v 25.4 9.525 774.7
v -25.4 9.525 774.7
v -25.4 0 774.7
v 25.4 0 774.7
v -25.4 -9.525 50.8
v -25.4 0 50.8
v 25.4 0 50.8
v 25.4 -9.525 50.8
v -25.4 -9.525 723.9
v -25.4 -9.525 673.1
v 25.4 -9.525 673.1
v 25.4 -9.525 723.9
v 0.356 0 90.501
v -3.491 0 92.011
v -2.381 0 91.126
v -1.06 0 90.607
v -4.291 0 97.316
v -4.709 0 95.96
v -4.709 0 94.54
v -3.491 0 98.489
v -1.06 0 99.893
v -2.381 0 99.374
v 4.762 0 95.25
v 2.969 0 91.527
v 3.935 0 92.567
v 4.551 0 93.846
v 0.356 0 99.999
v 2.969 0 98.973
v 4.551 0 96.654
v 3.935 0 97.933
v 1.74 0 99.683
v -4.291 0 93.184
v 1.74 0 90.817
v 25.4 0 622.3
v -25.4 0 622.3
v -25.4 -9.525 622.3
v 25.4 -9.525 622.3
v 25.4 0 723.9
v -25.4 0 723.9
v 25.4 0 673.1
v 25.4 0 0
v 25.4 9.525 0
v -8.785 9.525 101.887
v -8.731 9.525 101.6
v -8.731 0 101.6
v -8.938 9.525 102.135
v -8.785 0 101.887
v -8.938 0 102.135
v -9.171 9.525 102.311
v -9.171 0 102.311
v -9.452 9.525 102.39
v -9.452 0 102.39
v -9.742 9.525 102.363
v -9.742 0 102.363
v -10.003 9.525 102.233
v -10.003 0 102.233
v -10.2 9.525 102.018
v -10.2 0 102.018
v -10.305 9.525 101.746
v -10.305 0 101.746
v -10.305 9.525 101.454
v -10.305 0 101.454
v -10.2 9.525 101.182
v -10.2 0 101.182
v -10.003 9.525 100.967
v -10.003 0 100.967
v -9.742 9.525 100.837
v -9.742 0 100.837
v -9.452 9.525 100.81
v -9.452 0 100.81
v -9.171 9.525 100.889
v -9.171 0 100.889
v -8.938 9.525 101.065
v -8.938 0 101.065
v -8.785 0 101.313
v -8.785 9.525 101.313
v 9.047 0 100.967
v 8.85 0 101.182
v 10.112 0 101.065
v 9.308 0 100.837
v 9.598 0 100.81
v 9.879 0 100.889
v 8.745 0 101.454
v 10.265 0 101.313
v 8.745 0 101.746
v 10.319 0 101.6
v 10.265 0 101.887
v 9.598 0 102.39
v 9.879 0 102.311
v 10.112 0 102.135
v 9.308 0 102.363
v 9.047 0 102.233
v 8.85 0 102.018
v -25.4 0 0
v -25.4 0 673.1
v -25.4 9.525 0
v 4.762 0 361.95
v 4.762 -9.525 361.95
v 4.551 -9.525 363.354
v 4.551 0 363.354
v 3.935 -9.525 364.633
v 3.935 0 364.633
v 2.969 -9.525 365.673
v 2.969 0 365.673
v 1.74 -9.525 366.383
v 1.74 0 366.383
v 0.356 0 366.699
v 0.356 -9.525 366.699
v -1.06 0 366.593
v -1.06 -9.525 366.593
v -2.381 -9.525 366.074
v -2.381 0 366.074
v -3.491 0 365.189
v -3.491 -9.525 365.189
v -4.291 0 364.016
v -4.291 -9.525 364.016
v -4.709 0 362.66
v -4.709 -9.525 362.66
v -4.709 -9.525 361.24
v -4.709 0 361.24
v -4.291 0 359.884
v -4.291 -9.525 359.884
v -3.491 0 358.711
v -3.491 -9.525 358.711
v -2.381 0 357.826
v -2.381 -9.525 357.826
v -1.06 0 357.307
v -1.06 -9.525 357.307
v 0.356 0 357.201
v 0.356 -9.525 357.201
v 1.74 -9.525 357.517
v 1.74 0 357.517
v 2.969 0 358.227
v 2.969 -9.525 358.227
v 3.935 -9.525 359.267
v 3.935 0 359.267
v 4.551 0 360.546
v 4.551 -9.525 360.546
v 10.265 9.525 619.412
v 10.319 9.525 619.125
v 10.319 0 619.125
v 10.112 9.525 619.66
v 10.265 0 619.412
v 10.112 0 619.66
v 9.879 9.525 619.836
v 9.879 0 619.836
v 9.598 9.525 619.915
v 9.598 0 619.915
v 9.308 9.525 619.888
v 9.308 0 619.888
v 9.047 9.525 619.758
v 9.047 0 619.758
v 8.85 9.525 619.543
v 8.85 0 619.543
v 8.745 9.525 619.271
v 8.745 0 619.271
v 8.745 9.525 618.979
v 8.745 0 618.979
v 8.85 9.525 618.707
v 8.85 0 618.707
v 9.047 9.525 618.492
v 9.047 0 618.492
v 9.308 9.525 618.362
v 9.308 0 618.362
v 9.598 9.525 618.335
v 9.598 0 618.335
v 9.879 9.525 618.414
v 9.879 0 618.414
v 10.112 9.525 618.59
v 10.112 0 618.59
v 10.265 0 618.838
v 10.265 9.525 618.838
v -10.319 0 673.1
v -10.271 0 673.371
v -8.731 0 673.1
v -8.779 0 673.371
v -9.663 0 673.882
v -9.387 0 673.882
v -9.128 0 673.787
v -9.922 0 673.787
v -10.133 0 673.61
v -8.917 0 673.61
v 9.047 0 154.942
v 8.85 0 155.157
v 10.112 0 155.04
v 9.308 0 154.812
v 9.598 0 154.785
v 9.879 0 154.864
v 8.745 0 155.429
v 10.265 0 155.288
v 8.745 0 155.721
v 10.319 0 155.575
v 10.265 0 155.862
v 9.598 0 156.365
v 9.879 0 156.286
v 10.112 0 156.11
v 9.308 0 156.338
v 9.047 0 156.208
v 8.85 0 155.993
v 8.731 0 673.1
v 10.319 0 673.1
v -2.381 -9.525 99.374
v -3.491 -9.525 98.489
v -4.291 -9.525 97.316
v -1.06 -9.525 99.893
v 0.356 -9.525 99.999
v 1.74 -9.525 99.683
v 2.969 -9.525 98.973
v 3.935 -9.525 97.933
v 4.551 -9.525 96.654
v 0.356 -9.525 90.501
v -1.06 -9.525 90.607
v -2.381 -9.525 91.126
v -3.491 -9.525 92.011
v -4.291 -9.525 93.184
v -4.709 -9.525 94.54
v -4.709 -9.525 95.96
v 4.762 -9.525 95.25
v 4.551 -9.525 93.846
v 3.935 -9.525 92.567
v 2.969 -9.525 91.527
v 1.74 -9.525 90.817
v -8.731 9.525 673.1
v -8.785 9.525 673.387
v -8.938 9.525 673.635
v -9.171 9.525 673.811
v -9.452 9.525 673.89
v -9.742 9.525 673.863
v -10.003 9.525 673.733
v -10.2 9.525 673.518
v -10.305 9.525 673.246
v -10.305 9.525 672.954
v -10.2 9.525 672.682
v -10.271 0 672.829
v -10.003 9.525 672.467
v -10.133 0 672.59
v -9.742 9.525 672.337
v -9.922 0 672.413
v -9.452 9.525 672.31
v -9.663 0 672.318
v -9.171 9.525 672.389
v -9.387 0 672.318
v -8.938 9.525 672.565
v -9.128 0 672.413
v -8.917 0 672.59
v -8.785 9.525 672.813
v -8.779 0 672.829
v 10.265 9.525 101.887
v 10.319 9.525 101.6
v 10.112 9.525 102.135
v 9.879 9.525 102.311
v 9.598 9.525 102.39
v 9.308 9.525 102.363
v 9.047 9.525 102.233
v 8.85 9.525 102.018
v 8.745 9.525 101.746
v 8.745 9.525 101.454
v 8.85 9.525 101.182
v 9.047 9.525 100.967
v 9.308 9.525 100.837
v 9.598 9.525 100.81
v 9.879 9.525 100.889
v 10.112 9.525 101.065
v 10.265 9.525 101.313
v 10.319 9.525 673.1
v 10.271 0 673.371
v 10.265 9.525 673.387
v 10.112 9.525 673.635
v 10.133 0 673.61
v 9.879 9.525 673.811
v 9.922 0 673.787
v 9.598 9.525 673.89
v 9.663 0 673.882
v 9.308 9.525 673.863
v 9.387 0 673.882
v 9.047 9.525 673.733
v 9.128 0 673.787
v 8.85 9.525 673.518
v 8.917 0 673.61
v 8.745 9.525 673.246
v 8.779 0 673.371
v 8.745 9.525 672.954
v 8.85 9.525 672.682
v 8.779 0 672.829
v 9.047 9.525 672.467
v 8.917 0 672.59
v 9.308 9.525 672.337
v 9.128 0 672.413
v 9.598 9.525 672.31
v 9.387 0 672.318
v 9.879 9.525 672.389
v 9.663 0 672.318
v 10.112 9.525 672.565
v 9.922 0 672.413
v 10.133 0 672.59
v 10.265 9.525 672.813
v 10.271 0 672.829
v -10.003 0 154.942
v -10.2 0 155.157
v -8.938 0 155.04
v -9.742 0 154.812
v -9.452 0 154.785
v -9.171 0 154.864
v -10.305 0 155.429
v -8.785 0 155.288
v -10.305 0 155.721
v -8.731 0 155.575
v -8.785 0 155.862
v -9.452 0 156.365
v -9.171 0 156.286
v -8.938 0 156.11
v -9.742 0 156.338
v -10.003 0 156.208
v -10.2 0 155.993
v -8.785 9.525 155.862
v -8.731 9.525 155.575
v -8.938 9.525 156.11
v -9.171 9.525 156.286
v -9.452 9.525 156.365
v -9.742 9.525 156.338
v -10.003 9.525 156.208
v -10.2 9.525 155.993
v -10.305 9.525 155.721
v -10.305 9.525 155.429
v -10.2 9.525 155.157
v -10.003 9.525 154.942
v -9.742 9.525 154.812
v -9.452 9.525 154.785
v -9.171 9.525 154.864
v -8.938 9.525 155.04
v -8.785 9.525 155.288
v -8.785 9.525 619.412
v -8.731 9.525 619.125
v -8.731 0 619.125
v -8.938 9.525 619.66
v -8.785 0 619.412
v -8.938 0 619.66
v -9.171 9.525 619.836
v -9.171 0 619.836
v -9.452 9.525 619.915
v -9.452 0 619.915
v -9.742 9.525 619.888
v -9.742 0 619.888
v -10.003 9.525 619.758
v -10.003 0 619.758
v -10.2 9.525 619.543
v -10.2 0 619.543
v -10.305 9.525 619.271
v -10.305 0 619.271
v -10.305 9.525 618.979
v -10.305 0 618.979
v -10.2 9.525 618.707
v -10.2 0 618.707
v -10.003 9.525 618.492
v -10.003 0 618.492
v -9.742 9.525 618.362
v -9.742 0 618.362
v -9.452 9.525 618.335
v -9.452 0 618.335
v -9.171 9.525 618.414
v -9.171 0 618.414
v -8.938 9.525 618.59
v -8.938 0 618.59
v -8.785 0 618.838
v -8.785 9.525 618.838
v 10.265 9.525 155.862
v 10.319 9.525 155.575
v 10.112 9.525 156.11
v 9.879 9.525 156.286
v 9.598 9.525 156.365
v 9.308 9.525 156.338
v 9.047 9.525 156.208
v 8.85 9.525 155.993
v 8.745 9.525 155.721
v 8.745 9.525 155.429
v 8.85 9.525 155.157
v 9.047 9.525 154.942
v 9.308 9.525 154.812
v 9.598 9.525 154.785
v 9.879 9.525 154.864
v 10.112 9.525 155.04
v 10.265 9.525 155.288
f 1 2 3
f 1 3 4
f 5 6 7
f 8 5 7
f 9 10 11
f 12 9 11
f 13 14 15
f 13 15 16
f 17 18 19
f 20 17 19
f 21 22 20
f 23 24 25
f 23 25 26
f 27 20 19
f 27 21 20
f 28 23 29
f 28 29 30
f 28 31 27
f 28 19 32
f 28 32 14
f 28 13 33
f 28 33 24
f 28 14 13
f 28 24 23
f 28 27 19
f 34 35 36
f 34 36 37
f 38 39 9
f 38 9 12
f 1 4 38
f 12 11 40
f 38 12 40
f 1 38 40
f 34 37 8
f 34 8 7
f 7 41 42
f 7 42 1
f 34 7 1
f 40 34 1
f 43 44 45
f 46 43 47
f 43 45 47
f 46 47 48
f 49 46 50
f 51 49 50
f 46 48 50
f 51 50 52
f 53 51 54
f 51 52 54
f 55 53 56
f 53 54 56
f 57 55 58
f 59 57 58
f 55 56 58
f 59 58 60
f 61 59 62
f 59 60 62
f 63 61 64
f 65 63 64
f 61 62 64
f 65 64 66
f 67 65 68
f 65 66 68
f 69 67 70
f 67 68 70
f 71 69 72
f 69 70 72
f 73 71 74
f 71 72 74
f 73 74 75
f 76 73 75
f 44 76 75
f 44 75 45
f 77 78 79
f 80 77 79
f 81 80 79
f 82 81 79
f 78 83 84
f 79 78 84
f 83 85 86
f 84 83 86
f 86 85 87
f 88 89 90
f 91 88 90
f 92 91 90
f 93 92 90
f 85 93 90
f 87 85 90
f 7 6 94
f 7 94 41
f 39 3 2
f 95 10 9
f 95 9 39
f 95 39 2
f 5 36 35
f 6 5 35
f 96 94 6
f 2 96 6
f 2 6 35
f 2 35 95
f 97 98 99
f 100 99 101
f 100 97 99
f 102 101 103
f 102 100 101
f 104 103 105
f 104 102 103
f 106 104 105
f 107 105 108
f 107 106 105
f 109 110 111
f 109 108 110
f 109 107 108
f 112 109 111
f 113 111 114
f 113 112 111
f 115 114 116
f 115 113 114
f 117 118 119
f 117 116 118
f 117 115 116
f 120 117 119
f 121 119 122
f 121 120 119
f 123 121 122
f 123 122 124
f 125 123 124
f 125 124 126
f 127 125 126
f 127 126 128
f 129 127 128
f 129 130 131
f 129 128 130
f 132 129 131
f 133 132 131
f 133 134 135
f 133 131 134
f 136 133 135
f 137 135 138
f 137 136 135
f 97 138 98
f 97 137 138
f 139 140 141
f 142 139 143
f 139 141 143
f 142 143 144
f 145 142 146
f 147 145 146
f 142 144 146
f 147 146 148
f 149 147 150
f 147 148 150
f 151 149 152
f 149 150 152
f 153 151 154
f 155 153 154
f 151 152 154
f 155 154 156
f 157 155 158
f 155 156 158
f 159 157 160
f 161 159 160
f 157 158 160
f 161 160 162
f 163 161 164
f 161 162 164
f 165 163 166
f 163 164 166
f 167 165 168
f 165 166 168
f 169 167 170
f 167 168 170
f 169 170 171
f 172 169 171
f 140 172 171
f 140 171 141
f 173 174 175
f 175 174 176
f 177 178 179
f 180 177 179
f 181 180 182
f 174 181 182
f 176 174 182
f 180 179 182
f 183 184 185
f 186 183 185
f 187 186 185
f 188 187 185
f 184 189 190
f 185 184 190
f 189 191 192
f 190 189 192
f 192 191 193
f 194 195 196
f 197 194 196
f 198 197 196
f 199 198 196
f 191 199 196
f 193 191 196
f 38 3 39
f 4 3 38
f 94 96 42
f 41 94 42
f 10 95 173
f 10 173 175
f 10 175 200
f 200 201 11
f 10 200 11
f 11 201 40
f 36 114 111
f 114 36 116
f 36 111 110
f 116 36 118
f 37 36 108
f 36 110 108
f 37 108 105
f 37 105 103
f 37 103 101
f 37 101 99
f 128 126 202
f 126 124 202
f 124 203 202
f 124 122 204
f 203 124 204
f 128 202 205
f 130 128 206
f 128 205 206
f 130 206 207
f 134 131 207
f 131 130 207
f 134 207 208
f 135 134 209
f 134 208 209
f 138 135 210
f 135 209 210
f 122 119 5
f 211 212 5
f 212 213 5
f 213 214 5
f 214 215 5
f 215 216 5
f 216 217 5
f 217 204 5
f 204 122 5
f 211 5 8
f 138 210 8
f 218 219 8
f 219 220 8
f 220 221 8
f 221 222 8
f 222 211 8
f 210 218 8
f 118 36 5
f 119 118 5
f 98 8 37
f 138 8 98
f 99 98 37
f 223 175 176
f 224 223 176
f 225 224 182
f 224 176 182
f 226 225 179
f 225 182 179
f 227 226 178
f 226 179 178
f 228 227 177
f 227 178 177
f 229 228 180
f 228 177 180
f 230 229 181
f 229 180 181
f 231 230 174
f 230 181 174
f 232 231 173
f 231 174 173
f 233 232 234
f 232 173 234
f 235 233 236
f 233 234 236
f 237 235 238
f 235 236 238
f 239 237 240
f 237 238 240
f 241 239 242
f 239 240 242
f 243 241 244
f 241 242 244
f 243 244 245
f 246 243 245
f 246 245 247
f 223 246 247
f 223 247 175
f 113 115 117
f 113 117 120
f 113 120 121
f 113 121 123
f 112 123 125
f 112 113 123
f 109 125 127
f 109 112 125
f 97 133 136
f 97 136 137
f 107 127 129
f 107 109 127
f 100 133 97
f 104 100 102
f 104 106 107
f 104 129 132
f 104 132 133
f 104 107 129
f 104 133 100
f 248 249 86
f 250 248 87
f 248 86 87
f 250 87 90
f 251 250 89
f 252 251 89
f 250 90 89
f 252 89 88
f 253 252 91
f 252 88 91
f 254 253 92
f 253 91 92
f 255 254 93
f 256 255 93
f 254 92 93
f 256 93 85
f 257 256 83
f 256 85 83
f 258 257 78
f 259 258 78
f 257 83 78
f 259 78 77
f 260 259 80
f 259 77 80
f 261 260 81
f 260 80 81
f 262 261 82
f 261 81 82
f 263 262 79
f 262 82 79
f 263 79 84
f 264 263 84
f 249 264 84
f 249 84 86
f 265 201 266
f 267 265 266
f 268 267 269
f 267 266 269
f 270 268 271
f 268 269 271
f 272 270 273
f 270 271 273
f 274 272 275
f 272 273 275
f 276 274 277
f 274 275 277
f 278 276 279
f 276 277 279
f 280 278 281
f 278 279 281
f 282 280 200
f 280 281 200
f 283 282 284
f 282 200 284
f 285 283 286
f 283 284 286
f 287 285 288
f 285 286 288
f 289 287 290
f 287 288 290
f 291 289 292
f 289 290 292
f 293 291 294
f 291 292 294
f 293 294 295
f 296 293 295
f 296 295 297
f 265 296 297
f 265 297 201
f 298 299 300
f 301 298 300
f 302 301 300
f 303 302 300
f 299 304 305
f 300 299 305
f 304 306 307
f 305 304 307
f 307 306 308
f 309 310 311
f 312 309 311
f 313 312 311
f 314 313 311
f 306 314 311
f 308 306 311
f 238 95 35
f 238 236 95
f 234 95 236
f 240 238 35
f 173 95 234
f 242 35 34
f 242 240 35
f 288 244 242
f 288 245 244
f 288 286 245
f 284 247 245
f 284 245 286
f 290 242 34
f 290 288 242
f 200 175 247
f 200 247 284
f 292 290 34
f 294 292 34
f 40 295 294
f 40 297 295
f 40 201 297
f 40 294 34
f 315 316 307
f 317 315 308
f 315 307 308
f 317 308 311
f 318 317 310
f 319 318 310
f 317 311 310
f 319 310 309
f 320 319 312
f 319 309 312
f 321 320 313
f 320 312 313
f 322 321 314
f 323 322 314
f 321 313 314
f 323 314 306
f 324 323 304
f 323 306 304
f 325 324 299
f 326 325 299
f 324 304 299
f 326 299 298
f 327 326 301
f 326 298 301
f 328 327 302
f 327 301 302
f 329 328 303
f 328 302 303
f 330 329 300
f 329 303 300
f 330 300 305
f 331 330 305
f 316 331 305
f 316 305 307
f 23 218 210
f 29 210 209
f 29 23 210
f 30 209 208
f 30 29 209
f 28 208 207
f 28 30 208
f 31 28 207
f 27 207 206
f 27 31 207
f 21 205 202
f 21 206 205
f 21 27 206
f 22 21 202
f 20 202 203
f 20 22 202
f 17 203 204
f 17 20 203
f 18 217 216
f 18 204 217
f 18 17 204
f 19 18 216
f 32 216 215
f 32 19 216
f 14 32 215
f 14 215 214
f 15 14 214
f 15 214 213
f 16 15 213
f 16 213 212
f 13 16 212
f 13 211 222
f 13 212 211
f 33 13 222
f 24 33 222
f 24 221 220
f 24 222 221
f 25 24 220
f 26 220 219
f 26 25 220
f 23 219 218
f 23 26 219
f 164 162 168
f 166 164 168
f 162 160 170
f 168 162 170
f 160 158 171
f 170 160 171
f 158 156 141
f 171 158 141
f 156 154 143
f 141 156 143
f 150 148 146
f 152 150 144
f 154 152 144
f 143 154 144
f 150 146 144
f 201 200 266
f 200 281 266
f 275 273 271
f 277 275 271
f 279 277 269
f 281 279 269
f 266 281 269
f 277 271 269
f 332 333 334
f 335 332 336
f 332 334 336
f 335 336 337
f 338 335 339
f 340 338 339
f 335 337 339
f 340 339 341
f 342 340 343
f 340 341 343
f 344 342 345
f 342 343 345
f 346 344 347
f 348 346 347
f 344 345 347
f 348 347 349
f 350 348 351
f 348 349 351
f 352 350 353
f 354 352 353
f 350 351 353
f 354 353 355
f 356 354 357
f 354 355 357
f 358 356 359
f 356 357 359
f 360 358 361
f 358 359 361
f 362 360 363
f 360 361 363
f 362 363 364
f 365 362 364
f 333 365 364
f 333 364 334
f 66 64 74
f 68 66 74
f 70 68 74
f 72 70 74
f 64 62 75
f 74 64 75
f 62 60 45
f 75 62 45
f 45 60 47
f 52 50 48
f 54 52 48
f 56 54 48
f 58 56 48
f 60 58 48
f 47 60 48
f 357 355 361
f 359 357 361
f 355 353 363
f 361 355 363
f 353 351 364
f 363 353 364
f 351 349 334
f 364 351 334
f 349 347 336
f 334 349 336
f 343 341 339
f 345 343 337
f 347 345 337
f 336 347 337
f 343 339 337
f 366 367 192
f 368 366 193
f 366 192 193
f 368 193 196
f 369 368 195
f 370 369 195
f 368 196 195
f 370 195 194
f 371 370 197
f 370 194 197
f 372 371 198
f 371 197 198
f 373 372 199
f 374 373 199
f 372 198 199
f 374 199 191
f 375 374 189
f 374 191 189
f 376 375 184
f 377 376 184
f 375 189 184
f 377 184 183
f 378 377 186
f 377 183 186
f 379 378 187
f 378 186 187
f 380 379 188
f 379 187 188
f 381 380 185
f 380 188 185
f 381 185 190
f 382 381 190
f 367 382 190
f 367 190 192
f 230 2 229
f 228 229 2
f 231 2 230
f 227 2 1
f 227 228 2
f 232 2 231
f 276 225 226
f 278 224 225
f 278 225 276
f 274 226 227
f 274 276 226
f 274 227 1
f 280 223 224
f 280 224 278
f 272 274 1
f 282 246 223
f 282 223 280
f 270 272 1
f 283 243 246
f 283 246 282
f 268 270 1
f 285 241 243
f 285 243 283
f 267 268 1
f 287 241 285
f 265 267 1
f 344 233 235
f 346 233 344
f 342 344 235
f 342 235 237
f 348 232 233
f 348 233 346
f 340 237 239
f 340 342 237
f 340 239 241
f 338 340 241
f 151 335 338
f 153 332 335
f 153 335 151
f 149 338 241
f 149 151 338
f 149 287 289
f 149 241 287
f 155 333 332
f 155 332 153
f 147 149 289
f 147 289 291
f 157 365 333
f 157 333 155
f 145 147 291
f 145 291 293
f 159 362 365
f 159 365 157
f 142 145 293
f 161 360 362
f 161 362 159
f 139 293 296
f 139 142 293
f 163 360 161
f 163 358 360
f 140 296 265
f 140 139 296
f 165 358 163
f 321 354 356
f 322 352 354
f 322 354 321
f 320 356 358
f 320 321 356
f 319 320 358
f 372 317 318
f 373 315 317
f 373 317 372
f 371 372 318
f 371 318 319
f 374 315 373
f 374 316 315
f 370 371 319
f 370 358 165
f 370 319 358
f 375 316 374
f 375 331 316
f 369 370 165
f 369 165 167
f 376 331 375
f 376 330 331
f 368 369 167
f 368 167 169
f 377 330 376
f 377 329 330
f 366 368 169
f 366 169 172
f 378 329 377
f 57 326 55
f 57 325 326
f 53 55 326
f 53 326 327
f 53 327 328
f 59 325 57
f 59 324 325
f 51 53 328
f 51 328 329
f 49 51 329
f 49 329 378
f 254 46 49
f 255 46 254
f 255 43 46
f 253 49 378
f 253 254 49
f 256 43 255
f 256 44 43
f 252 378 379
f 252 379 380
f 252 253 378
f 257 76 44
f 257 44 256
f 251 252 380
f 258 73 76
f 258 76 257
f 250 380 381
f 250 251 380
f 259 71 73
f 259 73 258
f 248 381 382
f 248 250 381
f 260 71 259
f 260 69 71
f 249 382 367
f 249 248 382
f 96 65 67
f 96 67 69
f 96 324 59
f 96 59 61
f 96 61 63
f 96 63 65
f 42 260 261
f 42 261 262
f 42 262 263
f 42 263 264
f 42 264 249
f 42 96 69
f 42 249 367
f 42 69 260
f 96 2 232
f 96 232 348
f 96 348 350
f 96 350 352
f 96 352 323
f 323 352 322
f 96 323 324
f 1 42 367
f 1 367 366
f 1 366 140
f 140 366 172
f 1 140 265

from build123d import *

# Parameters (mm, degrees)
F0_W     = 50.8
F0_H     = 19.05
F1_DEPTH = 774.7
F2_W     = 122.43557321
F2_H     = 50.8
F2_W_2   = 343.1604206562
F2_W_3   = 253.376558423
F3_DEPTH = 25.4
F4_R     = 0.79375
F5_DEPTH = 25.4
F6_R     = 4.7625
F7_DEPTH = 25.4


# Not quite as in the source:
# - a feature names something its author has since deleted; it is built from what else it names


with BuildPart() as f1:
    # F0 (on Top) → F1 (new body)
    with BuildSketch(Plane.XY):
        Rectangle(F0_W, F0_H)
    extrude(amount=F1_DEPTH)

    # F2 (on Front) → F3 (cut)
    with BuildSketch(Plane.XZ):
        with Locations((22.4465244144, 25.4)):
            Rectangle(F2_W, F2_H)
        with Locations((-38.7818217278, 749.3)):
            Rectangle(F2_W_2, F2_H)
        with Locations((-33.7835475802, 647.7)):
            Rectangle(F2_W_3, F2_H)
    extrude(amount=F3_DEPTH, mode=Mode.SUBTRACT)

    # F4 (on Front) → F5 (cut)
    with BuildSketch(Plane.XZ):
        with Locations((9.525, 101.6)):
            Circle(F4_R)
        with Locations((9.525, 155.575)):
            Circle(F4_R)
        with Locations((9.525, 619.125)):
            Circle(F4_R)
        with Locations((9.525, 673.1)):
            Circle(F4_R)
        with Locations((-9.525, 619.125)):
            Circle(F4_R)
        with Locations((-9.525, 673.1)):
            Circle(F4_R)
        with Locations((-9.525, 101.6)):
            Circle(F4_R)
        with Locations((-9.525, 155.575)):
            Circle(F4_R)
    extrude(amount=-F5_DEPTH, mode=Mode.SUBTRACT)

    # F6 (on Front) → F7 (cut)
    with BuildSketch(Plane.XZ):
        with Locations((0, 95.25)):
            Circle(F6_R)
        with Locations((0, 361.95)):
            Circle(F6_R)
    extrude(amount=F7_DEPTH, mode=Mode.SUBTRACT)


solid = f1.part
